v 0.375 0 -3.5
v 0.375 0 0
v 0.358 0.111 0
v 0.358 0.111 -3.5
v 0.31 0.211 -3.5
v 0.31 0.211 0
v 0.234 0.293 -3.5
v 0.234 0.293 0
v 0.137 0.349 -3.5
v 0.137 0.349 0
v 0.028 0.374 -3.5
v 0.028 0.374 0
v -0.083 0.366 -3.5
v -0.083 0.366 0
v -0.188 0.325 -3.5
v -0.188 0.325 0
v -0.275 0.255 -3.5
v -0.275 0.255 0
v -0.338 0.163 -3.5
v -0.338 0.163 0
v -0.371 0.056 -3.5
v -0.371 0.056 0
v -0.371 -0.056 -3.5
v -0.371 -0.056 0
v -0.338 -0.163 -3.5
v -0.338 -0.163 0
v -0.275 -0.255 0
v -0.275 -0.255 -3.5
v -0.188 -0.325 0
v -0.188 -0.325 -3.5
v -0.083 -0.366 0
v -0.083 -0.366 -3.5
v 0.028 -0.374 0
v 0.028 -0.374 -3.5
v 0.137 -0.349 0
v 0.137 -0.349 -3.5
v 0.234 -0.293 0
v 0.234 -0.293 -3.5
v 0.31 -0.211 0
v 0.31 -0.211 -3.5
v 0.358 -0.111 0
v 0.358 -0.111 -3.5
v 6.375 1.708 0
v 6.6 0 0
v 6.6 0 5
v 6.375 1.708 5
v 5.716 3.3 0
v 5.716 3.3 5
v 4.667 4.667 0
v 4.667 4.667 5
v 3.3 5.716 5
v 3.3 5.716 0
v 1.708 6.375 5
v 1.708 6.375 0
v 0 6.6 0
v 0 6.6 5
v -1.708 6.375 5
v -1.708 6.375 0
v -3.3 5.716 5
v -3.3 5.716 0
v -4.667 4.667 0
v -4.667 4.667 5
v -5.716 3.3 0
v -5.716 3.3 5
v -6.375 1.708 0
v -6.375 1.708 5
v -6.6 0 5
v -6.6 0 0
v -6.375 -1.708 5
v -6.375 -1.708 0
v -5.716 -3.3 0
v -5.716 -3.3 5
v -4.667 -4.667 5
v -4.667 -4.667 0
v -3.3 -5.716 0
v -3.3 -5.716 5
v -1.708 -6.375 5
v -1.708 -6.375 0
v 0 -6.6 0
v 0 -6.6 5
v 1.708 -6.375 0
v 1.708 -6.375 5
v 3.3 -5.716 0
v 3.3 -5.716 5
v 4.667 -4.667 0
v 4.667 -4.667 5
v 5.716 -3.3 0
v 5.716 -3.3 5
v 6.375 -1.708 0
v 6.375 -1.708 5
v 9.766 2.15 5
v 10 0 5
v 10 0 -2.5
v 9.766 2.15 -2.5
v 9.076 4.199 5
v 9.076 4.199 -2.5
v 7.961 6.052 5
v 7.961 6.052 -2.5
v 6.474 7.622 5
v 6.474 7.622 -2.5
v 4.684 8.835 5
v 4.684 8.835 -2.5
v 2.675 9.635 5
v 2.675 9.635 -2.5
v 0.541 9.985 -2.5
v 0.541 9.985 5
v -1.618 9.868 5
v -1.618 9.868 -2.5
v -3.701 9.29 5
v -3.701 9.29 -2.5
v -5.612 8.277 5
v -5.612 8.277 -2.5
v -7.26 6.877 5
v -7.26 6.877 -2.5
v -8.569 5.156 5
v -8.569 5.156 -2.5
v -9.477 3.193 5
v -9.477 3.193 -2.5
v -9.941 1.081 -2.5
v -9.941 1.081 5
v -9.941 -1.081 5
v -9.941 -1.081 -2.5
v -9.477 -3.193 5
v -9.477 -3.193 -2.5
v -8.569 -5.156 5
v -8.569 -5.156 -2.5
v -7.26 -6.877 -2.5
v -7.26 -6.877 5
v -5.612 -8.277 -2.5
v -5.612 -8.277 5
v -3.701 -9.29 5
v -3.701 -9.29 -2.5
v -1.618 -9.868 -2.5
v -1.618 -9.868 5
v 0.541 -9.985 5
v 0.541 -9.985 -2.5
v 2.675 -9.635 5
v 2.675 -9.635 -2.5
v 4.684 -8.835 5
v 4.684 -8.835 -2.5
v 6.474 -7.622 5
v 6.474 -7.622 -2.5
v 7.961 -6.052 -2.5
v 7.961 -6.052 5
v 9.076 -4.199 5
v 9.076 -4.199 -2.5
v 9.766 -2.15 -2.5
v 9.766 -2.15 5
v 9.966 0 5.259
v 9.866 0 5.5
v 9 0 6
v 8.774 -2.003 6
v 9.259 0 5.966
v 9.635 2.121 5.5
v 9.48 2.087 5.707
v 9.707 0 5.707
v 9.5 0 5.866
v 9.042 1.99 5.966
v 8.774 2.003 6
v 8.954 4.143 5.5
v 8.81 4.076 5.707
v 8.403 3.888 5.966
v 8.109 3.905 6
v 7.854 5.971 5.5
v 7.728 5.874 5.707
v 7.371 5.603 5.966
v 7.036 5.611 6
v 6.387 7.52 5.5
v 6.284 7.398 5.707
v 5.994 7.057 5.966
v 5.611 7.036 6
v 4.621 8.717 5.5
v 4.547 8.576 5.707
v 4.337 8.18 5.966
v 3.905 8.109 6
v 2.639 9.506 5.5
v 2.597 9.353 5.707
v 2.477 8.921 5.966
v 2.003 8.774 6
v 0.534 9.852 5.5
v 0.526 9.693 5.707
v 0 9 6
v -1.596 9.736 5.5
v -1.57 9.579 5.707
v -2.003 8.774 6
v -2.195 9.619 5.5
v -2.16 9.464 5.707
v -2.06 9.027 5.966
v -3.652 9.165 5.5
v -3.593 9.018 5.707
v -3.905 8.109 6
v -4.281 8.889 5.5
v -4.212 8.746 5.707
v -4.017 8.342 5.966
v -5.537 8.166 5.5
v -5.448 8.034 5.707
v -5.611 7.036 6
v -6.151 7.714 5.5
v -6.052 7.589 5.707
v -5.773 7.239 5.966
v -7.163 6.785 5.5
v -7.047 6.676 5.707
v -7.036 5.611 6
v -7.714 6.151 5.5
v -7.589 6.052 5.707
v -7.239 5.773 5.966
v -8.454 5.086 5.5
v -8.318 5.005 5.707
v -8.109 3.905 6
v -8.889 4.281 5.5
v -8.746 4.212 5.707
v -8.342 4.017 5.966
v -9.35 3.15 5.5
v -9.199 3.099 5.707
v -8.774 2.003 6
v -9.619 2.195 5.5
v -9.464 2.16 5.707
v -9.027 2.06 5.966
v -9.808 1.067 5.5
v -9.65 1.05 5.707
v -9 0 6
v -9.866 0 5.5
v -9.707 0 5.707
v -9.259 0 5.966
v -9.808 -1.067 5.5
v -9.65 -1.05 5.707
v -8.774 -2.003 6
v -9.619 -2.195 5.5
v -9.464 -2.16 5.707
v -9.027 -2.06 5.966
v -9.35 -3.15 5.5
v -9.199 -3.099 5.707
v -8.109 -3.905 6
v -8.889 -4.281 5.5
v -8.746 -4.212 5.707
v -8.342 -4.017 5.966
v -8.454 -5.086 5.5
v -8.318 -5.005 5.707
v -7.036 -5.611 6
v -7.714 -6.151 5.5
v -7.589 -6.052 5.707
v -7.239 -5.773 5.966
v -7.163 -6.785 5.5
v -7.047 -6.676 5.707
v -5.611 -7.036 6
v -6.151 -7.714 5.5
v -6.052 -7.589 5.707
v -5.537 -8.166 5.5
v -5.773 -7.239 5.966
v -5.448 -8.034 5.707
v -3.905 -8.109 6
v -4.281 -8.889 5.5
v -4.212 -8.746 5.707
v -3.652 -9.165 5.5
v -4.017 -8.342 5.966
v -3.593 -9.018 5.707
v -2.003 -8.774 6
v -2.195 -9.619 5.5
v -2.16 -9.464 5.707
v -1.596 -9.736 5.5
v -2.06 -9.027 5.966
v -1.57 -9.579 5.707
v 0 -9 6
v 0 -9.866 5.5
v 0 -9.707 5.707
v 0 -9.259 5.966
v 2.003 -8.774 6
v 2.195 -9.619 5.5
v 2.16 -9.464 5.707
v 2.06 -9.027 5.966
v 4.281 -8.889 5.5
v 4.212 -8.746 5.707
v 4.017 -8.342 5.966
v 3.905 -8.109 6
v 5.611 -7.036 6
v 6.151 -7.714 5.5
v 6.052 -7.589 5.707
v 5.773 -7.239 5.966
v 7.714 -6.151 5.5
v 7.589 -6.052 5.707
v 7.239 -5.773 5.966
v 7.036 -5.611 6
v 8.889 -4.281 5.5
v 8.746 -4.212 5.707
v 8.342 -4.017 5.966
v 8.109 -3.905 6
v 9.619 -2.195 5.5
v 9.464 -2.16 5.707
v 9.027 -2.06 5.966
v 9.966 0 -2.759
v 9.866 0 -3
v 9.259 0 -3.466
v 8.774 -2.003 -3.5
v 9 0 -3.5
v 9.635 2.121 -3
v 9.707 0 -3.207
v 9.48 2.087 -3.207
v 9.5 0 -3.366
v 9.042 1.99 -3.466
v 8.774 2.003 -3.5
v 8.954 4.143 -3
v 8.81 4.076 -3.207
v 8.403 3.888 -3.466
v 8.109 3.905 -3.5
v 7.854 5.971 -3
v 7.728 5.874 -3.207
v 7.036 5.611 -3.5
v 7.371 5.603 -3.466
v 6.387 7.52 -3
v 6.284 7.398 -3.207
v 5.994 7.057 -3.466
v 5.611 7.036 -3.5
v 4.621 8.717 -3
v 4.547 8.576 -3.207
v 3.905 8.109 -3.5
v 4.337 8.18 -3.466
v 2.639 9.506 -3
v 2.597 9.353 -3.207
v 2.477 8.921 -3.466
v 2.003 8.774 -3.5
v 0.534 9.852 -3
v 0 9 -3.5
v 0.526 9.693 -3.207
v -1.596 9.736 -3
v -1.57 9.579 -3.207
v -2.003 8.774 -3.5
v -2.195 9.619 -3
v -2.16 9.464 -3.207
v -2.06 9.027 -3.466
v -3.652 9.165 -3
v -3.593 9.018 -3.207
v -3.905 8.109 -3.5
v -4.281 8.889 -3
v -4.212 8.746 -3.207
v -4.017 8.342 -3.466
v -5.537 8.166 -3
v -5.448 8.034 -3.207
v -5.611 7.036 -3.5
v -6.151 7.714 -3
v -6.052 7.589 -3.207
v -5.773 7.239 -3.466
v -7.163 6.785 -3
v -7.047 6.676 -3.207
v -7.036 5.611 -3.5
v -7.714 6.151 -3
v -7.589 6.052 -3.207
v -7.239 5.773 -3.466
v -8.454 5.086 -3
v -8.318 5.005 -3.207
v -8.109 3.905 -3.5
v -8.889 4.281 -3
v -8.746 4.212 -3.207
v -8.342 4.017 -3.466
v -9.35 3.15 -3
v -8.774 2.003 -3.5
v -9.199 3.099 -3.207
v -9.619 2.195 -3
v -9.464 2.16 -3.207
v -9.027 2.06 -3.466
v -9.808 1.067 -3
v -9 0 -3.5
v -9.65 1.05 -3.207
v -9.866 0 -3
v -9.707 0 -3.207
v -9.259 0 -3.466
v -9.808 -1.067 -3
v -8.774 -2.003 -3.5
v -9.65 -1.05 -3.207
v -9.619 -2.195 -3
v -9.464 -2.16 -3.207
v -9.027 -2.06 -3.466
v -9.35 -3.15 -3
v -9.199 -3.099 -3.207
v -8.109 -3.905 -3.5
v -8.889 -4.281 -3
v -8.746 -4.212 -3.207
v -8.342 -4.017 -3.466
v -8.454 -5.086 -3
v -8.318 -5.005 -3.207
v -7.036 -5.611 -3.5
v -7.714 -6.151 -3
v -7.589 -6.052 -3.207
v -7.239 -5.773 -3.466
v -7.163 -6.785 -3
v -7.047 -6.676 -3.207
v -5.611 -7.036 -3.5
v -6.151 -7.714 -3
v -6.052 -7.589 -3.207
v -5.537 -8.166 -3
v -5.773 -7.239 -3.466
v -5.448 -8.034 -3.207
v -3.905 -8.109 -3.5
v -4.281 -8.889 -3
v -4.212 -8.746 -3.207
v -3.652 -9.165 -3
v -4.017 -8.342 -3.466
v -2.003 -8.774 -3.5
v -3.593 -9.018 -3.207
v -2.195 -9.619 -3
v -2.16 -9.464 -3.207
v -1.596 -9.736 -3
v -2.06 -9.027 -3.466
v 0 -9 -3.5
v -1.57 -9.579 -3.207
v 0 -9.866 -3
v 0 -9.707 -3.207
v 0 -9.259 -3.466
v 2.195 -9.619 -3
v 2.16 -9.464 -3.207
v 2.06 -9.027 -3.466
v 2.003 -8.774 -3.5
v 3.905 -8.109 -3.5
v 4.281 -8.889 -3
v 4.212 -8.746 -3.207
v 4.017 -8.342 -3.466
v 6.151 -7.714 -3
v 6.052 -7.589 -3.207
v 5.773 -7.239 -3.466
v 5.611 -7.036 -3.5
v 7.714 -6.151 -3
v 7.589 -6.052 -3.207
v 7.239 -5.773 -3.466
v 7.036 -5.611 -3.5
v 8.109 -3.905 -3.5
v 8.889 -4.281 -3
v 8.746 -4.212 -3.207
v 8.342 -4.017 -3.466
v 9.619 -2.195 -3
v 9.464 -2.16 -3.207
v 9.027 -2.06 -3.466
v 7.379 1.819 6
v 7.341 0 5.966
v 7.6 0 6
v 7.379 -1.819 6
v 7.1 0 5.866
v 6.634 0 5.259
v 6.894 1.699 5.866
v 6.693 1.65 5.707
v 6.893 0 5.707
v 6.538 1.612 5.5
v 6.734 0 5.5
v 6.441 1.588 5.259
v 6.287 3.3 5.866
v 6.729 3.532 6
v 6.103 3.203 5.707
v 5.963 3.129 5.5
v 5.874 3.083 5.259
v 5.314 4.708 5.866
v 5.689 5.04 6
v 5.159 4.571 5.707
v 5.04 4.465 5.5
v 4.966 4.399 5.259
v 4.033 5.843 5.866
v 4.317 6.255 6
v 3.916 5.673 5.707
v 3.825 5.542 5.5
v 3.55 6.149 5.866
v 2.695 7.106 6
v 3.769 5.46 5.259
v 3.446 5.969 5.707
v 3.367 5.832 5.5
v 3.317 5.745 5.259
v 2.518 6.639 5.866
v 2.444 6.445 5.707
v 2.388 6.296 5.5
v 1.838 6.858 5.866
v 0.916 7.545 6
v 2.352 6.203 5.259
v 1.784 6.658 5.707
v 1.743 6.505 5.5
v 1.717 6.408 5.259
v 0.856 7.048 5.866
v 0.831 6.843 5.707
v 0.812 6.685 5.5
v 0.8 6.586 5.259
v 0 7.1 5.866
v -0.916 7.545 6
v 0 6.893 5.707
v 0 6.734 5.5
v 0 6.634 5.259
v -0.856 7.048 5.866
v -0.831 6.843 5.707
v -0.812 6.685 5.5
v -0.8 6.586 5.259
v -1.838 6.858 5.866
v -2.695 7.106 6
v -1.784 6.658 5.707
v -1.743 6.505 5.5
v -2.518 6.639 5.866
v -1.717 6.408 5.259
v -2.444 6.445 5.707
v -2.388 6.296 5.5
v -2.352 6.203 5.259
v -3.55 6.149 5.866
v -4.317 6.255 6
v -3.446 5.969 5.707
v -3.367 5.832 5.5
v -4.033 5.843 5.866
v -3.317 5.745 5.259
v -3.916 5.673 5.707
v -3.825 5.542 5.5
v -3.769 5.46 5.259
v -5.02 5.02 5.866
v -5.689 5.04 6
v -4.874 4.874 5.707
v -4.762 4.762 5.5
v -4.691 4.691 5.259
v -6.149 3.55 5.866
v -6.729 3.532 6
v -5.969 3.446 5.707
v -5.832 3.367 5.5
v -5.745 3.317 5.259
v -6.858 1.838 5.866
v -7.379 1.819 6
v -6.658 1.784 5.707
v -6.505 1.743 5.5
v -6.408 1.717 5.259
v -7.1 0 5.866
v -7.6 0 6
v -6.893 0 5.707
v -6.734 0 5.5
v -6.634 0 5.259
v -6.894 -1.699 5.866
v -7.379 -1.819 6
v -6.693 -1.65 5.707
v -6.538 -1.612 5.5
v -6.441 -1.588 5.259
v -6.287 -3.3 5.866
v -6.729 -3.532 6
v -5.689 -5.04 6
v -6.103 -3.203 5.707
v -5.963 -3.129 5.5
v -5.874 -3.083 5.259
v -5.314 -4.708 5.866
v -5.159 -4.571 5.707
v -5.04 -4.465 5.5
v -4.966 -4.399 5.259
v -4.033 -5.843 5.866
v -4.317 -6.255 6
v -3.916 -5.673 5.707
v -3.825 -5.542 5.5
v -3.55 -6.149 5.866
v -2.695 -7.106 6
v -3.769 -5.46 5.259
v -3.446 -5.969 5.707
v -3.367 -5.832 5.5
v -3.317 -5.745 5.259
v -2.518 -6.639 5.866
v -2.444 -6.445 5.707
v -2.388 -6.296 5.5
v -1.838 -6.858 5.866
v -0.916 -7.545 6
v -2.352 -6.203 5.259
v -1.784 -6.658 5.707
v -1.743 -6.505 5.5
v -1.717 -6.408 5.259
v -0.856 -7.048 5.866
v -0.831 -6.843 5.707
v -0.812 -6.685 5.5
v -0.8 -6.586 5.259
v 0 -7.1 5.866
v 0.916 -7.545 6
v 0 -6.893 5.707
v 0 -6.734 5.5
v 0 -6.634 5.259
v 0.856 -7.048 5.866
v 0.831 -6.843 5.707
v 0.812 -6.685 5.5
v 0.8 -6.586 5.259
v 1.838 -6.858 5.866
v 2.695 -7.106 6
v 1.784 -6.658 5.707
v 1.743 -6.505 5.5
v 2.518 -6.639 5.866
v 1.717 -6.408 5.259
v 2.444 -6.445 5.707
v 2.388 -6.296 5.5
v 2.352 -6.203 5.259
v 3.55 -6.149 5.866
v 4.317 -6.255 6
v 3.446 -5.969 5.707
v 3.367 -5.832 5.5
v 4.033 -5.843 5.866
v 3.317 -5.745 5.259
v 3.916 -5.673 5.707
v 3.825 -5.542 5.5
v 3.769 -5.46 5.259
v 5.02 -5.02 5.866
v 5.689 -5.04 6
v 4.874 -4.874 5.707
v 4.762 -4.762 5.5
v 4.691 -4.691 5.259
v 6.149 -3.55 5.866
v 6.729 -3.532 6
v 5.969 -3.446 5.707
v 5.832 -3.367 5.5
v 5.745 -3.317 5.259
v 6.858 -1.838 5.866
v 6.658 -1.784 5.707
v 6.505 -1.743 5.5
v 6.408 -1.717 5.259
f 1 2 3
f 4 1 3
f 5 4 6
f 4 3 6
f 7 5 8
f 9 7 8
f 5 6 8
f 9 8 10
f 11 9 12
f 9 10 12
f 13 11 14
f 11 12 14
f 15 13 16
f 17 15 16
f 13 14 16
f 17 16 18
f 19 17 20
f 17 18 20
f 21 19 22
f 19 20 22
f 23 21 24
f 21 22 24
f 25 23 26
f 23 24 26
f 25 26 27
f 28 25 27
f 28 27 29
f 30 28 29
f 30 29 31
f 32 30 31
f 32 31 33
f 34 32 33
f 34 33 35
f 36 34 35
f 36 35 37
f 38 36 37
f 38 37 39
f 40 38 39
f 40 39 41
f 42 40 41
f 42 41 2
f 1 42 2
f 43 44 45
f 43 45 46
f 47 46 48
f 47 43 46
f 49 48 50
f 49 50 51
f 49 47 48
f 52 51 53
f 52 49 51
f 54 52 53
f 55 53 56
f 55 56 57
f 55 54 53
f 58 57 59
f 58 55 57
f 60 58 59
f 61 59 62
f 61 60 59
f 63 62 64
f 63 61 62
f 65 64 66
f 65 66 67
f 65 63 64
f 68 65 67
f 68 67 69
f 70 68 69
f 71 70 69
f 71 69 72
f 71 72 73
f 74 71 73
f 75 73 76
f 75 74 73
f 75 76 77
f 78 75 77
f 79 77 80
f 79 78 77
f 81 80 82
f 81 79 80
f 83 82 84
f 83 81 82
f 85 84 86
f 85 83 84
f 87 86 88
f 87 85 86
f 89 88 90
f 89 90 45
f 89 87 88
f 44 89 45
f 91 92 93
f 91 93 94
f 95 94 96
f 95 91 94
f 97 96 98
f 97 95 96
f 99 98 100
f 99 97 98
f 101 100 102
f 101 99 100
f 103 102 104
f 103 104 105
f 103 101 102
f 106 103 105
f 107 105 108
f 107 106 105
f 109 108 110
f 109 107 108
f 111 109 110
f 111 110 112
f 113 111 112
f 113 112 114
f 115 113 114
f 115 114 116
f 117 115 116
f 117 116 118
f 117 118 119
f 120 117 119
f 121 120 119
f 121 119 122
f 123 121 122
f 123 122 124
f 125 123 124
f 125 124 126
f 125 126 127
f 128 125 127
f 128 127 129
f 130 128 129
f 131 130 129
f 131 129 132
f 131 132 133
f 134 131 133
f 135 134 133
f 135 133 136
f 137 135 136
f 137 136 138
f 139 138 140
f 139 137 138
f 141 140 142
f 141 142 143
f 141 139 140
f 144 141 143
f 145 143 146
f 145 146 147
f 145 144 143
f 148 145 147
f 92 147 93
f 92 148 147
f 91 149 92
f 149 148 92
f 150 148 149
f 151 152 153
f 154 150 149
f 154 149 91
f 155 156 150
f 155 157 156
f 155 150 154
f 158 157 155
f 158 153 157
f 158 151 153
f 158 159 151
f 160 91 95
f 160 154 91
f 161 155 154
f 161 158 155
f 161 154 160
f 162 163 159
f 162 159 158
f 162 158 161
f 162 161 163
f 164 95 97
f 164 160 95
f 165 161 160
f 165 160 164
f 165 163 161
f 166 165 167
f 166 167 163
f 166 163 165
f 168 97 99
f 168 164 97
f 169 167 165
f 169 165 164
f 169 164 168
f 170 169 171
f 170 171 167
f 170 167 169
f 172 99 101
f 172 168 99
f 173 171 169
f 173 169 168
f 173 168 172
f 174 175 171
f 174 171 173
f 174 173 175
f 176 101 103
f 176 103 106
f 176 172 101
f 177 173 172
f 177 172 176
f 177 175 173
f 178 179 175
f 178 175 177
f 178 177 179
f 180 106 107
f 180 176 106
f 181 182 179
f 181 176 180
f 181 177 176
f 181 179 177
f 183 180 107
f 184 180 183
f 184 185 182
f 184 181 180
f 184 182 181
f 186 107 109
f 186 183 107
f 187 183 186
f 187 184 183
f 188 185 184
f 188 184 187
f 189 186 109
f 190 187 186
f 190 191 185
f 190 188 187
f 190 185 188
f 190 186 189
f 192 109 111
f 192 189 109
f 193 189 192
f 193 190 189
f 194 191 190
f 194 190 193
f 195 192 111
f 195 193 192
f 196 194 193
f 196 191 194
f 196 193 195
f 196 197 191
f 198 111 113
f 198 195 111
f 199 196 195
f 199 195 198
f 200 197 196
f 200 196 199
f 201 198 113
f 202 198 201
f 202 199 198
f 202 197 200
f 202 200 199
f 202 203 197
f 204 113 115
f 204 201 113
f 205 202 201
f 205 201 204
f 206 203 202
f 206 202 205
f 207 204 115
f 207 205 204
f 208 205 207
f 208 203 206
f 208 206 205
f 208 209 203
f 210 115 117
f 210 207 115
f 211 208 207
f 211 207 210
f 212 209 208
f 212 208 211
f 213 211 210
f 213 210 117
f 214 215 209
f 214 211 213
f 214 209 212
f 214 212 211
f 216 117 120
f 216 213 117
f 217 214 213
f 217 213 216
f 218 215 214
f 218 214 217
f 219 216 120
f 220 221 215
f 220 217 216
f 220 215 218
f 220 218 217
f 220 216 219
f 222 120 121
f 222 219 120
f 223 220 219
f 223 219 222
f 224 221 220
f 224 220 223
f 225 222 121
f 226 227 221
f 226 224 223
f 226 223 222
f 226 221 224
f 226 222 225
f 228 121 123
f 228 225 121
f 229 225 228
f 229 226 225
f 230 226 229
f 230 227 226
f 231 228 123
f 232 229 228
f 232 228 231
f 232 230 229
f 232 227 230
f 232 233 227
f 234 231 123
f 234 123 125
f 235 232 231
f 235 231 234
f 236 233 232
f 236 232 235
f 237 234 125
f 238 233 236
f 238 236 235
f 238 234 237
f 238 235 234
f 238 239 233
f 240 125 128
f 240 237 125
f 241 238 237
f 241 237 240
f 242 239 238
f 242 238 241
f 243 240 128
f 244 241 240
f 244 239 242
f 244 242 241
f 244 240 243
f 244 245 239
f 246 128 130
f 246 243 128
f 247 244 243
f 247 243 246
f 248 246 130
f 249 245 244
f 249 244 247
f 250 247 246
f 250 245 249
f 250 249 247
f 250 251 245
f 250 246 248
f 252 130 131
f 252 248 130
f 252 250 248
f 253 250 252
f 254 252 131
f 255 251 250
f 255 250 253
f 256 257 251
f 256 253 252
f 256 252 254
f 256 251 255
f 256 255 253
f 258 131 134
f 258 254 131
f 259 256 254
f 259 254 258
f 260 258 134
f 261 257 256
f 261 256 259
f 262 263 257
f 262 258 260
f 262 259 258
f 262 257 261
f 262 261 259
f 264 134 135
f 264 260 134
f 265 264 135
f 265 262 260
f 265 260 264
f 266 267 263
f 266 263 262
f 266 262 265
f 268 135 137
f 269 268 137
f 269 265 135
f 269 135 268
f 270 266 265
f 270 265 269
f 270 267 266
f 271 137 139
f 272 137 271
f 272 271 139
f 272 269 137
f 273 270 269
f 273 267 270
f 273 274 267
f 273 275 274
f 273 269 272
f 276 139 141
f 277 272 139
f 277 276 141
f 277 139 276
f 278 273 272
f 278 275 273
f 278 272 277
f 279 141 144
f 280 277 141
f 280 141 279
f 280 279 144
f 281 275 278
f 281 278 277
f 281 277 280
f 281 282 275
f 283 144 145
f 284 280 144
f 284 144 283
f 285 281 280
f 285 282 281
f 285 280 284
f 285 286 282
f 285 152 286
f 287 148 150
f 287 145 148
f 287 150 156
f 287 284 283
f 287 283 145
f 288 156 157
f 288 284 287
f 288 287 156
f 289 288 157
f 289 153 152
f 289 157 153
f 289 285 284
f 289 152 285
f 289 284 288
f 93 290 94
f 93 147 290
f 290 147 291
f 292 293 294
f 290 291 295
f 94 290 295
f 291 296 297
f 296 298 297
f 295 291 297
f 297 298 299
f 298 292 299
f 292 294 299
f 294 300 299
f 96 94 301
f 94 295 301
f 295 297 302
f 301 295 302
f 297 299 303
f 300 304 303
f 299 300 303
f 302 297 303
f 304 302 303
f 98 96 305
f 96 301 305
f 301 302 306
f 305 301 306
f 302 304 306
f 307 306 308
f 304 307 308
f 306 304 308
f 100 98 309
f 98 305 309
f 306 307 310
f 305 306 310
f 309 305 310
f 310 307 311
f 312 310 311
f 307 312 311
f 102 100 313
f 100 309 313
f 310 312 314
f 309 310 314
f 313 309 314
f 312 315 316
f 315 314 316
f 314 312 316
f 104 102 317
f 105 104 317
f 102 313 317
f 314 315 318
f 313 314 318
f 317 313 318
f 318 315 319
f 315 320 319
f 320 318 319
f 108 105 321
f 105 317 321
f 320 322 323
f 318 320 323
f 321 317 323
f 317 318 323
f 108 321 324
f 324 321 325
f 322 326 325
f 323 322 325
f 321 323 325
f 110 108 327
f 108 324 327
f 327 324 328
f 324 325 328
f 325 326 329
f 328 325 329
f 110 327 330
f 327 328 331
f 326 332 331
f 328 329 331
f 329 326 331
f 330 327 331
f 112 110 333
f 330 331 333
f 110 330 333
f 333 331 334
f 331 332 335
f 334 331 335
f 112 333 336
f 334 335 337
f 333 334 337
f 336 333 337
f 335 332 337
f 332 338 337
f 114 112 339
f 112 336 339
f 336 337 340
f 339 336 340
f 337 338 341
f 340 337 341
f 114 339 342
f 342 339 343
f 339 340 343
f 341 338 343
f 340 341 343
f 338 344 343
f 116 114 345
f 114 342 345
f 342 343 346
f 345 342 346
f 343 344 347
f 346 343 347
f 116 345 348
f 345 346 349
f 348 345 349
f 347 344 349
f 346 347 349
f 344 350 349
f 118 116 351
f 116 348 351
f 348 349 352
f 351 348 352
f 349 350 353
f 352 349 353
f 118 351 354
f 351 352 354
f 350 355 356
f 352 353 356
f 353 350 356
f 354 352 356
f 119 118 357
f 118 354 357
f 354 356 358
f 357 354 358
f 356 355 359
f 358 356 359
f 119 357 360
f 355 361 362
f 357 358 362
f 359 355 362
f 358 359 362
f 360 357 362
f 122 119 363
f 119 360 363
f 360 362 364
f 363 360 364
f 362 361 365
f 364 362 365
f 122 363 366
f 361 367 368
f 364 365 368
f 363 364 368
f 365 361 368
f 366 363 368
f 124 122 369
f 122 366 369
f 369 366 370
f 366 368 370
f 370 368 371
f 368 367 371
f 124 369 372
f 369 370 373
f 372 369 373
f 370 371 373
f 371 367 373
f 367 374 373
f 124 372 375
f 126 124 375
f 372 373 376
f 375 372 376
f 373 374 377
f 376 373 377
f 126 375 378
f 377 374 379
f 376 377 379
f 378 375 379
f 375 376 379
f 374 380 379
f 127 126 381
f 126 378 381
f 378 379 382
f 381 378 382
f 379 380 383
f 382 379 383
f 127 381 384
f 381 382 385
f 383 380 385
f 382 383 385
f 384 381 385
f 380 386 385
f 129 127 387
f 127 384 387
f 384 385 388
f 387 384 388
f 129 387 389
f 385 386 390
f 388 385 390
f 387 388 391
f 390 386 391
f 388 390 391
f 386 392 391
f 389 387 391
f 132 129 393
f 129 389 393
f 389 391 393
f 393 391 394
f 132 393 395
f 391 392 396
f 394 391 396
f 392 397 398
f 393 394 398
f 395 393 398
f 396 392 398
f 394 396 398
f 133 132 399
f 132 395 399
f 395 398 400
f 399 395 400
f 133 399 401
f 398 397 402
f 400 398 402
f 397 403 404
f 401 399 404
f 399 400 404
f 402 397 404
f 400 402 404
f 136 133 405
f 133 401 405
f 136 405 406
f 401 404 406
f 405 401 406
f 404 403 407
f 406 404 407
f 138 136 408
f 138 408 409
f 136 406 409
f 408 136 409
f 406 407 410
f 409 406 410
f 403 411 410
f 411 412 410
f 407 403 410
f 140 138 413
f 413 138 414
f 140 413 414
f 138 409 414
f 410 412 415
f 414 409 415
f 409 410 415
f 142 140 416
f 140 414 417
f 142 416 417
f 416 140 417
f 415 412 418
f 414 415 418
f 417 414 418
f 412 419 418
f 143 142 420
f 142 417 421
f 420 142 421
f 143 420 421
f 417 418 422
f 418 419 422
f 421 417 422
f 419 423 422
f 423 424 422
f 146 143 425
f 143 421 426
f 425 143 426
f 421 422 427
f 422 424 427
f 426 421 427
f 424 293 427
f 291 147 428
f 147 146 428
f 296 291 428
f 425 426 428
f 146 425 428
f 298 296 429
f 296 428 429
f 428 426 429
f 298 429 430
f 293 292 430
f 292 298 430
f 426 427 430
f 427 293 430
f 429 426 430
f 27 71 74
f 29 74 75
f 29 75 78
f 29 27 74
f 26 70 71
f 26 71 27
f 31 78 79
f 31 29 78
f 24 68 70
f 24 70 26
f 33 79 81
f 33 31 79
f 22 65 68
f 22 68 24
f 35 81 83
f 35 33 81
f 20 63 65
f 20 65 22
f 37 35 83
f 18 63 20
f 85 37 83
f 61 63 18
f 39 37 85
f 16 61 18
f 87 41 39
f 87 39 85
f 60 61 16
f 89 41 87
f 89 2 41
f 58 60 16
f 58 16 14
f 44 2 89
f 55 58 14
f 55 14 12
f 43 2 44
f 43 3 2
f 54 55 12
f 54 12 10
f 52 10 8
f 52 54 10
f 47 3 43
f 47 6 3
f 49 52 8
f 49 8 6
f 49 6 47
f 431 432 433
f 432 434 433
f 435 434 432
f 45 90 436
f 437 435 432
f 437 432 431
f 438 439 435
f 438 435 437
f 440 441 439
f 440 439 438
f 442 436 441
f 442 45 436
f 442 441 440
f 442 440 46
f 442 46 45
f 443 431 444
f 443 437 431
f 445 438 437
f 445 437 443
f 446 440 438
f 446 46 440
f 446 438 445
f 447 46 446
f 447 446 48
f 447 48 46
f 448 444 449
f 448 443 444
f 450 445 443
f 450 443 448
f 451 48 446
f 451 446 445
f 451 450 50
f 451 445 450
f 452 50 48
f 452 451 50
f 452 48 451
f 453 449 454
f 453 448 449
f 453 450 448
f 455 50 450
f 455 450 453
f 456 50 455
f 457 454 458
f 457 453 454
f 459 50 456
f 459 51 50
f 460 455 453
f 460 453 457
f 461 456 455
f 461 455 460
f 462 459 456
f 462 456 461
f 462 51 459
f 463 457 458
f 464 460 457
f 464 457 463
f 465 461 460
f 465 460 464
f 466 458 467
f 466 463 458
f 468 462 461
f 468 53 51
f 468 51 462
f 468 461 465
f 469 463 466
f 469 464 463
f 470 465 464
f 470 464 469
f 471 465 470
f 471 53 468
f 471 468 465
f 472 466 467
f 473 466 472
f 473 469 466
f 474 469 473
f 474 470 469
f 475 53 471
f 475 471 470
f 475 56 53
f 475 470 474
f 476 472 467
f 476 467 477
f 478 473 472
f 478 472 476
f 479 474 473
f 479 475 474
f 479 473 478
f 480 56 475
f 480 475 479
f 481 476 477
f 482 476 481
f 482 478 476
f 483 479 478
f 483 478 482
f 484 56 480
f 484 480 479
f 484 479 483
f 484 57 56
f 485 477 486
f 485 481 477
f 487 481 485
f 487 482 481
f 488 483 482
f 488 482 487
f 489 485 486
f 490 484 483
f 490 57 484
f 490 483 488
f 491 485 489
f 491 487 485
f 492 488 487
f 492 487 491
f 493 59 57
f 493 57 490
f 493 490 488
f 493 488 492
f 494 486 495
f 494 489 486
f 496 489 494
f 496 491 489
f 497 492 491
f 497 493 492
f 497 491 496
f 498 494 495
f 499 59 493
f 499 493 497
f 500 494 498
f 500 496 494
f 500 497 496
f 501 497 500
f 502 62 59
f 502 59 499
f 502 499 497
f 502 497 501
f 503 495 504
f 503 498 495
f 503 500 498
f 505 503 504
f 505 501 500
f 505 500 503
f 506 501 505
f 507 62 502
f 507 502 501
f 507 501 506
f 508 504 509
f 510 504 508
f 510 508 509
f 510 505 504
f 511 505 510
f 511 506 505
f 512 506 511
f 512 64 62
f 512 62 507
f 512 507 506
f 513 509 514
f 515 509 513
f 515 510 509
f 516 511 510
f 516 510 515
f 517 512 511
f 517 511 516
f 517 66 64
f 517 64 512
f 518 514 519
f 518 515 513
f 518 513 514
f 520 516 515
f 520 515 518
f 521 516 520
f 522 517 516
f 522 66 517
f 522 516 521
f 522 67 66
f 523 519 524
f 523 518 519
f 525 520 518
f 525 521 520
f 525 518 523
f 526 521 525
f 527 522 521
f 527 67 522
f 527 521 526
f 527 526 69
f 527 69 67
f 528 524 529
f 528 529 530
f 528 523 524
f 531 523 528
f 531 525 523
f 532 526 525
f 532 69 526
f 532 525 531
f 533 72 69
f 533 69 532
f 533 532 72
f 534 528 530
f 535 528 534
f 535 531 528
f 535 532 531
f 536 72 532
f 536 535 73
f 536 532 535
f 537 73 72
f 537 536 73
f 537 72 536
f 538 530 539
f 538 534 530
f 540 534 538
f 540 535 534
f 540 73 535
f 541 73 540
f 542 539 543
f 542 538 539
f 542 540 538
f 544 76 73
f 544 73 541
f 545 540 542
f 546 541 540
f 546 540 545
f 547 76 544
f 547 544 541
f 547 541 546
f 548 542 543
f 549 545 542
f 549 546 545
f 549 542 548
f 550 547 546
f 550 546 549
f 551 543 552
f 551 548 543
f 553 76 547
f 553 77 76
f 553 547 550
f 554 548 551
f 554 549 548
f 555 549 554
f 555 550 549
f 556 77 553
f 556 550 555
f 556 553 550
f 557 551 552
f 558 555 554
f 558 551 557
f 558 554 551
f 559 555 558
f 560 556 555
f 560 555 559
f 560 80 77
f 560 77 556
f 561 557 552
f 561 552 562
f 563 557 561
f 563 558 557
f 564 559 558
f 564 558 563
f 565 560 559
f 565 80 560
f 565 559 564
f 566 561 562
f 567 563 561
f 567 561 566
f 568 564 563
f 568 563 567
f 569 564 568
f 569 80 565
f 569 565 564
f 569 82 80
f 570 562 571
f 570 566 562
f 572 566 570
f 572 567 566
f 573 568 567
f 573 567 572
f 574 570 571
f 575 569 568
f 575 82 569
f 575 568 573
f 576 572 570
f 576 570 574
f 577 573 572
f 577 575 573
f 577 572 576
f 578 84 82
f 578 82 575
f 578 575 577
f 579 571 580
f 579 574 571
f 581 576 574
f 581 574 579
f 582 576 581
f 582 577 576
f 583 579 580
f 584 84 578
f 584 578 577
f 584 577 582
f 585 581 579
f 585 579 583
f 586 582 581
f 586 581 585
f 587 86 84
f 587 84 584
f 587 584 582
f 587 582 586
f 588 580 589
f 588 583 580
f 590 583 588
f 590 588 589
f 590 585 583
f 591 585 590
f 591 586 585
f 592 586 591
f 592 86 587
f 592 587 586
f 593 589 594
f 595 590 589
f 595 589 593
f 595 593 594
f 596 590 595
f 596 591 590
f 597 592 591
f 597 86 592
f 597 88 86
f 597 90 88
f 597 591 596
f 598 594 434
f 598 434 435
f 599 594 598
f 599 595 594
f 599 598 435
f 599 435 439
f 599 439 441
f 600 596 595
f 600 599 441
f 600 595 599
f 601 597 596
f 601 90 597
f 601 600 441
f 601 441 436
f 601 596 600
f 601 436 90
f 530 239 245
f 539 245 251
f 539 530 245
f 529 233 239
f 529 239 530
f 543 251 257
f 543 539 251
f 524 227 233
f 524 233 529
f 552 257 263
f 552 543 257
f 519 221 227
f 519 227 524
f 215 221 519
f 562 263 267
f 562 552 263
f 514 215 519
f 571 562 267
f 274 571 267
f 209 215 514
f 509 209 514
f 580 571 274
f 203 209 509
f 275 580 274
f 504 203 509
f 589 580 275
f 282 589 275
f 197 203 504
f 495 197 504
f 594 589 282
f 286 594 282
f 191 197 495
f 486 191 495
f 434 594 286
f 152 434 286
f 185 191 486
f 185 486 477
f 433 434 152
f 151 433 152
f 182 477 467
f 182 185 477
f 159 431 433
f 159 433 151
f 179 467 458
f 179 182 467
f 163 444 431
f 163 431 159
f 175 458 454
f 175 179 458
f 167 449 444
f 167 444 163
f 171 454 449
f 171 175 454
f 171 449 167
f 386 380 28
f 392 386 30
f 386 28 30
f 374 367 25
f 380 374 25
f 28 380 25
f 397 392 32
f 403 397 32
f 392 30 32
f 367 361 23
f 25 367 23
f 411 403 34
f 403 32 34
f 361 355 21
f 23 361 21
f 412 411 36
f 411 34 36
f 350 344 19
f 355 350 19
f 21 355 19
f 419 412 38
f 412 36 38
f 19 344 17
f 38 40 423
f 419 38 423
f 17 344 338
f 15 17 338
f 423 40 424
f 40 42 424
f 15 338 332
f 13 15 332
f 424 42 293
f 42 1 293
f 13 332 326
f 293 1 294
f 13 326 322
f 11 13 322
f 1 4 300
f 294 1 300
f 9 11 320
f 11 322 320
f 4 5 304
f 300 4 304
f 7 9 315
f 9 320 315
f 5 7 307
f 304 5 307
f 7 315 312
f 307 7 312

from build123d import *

# Parameters (mm, degrees)
F0_R     = 10
F1_DEPTH = 3.5
F2_R     = 10
F2_R_2   = 6.6
F3_DEPTH = 6
F4_R     = 1
F5_R     = 1
F6_R     = 0.375
F7_DEPTH = 3.501


# Not quite as in the source:
# - a feature names something its author has since deleted; it is built from what else it names


with BuildPart() as f1:
    # F0 (on Top) → F1 (new body)
    with BuildSketch(Plane.XY):
        Circle(F0_R)
    extrude(amount=-F1_DEPTH)

    # F2 (on face) → F3 (join)
    with BuildSketch(Plane.XY):
        Circle(F2_R)
        Circle(F2_R_2, mode=Mode.SUBTRACT)
    extrude(amount=F3_DEPTH)

    # F4
    f4_edges = [f1.edges().sort_by_distance(p)[0] for p in [
        (-6.6, 0, 6),
        (-10, 0, -3.5),
    ]]
    fillet(f4_edges, radius=F4_R)

    # F5
    f5_edges = [f1.edges().sort_by_distance(p)[0] for p in [
        (-10, 0, 6),
    ]]
    fillet(f5_edges, radius=F5_R)

    # F6 (on face) → F7 (cut, through all)
    with BuildSketch(Plane.XY):
        Circle(F6_R)
    extrude(amount=-F7_DEPTH, mode=Mode.SUBTRACT)


solid = f1.part
